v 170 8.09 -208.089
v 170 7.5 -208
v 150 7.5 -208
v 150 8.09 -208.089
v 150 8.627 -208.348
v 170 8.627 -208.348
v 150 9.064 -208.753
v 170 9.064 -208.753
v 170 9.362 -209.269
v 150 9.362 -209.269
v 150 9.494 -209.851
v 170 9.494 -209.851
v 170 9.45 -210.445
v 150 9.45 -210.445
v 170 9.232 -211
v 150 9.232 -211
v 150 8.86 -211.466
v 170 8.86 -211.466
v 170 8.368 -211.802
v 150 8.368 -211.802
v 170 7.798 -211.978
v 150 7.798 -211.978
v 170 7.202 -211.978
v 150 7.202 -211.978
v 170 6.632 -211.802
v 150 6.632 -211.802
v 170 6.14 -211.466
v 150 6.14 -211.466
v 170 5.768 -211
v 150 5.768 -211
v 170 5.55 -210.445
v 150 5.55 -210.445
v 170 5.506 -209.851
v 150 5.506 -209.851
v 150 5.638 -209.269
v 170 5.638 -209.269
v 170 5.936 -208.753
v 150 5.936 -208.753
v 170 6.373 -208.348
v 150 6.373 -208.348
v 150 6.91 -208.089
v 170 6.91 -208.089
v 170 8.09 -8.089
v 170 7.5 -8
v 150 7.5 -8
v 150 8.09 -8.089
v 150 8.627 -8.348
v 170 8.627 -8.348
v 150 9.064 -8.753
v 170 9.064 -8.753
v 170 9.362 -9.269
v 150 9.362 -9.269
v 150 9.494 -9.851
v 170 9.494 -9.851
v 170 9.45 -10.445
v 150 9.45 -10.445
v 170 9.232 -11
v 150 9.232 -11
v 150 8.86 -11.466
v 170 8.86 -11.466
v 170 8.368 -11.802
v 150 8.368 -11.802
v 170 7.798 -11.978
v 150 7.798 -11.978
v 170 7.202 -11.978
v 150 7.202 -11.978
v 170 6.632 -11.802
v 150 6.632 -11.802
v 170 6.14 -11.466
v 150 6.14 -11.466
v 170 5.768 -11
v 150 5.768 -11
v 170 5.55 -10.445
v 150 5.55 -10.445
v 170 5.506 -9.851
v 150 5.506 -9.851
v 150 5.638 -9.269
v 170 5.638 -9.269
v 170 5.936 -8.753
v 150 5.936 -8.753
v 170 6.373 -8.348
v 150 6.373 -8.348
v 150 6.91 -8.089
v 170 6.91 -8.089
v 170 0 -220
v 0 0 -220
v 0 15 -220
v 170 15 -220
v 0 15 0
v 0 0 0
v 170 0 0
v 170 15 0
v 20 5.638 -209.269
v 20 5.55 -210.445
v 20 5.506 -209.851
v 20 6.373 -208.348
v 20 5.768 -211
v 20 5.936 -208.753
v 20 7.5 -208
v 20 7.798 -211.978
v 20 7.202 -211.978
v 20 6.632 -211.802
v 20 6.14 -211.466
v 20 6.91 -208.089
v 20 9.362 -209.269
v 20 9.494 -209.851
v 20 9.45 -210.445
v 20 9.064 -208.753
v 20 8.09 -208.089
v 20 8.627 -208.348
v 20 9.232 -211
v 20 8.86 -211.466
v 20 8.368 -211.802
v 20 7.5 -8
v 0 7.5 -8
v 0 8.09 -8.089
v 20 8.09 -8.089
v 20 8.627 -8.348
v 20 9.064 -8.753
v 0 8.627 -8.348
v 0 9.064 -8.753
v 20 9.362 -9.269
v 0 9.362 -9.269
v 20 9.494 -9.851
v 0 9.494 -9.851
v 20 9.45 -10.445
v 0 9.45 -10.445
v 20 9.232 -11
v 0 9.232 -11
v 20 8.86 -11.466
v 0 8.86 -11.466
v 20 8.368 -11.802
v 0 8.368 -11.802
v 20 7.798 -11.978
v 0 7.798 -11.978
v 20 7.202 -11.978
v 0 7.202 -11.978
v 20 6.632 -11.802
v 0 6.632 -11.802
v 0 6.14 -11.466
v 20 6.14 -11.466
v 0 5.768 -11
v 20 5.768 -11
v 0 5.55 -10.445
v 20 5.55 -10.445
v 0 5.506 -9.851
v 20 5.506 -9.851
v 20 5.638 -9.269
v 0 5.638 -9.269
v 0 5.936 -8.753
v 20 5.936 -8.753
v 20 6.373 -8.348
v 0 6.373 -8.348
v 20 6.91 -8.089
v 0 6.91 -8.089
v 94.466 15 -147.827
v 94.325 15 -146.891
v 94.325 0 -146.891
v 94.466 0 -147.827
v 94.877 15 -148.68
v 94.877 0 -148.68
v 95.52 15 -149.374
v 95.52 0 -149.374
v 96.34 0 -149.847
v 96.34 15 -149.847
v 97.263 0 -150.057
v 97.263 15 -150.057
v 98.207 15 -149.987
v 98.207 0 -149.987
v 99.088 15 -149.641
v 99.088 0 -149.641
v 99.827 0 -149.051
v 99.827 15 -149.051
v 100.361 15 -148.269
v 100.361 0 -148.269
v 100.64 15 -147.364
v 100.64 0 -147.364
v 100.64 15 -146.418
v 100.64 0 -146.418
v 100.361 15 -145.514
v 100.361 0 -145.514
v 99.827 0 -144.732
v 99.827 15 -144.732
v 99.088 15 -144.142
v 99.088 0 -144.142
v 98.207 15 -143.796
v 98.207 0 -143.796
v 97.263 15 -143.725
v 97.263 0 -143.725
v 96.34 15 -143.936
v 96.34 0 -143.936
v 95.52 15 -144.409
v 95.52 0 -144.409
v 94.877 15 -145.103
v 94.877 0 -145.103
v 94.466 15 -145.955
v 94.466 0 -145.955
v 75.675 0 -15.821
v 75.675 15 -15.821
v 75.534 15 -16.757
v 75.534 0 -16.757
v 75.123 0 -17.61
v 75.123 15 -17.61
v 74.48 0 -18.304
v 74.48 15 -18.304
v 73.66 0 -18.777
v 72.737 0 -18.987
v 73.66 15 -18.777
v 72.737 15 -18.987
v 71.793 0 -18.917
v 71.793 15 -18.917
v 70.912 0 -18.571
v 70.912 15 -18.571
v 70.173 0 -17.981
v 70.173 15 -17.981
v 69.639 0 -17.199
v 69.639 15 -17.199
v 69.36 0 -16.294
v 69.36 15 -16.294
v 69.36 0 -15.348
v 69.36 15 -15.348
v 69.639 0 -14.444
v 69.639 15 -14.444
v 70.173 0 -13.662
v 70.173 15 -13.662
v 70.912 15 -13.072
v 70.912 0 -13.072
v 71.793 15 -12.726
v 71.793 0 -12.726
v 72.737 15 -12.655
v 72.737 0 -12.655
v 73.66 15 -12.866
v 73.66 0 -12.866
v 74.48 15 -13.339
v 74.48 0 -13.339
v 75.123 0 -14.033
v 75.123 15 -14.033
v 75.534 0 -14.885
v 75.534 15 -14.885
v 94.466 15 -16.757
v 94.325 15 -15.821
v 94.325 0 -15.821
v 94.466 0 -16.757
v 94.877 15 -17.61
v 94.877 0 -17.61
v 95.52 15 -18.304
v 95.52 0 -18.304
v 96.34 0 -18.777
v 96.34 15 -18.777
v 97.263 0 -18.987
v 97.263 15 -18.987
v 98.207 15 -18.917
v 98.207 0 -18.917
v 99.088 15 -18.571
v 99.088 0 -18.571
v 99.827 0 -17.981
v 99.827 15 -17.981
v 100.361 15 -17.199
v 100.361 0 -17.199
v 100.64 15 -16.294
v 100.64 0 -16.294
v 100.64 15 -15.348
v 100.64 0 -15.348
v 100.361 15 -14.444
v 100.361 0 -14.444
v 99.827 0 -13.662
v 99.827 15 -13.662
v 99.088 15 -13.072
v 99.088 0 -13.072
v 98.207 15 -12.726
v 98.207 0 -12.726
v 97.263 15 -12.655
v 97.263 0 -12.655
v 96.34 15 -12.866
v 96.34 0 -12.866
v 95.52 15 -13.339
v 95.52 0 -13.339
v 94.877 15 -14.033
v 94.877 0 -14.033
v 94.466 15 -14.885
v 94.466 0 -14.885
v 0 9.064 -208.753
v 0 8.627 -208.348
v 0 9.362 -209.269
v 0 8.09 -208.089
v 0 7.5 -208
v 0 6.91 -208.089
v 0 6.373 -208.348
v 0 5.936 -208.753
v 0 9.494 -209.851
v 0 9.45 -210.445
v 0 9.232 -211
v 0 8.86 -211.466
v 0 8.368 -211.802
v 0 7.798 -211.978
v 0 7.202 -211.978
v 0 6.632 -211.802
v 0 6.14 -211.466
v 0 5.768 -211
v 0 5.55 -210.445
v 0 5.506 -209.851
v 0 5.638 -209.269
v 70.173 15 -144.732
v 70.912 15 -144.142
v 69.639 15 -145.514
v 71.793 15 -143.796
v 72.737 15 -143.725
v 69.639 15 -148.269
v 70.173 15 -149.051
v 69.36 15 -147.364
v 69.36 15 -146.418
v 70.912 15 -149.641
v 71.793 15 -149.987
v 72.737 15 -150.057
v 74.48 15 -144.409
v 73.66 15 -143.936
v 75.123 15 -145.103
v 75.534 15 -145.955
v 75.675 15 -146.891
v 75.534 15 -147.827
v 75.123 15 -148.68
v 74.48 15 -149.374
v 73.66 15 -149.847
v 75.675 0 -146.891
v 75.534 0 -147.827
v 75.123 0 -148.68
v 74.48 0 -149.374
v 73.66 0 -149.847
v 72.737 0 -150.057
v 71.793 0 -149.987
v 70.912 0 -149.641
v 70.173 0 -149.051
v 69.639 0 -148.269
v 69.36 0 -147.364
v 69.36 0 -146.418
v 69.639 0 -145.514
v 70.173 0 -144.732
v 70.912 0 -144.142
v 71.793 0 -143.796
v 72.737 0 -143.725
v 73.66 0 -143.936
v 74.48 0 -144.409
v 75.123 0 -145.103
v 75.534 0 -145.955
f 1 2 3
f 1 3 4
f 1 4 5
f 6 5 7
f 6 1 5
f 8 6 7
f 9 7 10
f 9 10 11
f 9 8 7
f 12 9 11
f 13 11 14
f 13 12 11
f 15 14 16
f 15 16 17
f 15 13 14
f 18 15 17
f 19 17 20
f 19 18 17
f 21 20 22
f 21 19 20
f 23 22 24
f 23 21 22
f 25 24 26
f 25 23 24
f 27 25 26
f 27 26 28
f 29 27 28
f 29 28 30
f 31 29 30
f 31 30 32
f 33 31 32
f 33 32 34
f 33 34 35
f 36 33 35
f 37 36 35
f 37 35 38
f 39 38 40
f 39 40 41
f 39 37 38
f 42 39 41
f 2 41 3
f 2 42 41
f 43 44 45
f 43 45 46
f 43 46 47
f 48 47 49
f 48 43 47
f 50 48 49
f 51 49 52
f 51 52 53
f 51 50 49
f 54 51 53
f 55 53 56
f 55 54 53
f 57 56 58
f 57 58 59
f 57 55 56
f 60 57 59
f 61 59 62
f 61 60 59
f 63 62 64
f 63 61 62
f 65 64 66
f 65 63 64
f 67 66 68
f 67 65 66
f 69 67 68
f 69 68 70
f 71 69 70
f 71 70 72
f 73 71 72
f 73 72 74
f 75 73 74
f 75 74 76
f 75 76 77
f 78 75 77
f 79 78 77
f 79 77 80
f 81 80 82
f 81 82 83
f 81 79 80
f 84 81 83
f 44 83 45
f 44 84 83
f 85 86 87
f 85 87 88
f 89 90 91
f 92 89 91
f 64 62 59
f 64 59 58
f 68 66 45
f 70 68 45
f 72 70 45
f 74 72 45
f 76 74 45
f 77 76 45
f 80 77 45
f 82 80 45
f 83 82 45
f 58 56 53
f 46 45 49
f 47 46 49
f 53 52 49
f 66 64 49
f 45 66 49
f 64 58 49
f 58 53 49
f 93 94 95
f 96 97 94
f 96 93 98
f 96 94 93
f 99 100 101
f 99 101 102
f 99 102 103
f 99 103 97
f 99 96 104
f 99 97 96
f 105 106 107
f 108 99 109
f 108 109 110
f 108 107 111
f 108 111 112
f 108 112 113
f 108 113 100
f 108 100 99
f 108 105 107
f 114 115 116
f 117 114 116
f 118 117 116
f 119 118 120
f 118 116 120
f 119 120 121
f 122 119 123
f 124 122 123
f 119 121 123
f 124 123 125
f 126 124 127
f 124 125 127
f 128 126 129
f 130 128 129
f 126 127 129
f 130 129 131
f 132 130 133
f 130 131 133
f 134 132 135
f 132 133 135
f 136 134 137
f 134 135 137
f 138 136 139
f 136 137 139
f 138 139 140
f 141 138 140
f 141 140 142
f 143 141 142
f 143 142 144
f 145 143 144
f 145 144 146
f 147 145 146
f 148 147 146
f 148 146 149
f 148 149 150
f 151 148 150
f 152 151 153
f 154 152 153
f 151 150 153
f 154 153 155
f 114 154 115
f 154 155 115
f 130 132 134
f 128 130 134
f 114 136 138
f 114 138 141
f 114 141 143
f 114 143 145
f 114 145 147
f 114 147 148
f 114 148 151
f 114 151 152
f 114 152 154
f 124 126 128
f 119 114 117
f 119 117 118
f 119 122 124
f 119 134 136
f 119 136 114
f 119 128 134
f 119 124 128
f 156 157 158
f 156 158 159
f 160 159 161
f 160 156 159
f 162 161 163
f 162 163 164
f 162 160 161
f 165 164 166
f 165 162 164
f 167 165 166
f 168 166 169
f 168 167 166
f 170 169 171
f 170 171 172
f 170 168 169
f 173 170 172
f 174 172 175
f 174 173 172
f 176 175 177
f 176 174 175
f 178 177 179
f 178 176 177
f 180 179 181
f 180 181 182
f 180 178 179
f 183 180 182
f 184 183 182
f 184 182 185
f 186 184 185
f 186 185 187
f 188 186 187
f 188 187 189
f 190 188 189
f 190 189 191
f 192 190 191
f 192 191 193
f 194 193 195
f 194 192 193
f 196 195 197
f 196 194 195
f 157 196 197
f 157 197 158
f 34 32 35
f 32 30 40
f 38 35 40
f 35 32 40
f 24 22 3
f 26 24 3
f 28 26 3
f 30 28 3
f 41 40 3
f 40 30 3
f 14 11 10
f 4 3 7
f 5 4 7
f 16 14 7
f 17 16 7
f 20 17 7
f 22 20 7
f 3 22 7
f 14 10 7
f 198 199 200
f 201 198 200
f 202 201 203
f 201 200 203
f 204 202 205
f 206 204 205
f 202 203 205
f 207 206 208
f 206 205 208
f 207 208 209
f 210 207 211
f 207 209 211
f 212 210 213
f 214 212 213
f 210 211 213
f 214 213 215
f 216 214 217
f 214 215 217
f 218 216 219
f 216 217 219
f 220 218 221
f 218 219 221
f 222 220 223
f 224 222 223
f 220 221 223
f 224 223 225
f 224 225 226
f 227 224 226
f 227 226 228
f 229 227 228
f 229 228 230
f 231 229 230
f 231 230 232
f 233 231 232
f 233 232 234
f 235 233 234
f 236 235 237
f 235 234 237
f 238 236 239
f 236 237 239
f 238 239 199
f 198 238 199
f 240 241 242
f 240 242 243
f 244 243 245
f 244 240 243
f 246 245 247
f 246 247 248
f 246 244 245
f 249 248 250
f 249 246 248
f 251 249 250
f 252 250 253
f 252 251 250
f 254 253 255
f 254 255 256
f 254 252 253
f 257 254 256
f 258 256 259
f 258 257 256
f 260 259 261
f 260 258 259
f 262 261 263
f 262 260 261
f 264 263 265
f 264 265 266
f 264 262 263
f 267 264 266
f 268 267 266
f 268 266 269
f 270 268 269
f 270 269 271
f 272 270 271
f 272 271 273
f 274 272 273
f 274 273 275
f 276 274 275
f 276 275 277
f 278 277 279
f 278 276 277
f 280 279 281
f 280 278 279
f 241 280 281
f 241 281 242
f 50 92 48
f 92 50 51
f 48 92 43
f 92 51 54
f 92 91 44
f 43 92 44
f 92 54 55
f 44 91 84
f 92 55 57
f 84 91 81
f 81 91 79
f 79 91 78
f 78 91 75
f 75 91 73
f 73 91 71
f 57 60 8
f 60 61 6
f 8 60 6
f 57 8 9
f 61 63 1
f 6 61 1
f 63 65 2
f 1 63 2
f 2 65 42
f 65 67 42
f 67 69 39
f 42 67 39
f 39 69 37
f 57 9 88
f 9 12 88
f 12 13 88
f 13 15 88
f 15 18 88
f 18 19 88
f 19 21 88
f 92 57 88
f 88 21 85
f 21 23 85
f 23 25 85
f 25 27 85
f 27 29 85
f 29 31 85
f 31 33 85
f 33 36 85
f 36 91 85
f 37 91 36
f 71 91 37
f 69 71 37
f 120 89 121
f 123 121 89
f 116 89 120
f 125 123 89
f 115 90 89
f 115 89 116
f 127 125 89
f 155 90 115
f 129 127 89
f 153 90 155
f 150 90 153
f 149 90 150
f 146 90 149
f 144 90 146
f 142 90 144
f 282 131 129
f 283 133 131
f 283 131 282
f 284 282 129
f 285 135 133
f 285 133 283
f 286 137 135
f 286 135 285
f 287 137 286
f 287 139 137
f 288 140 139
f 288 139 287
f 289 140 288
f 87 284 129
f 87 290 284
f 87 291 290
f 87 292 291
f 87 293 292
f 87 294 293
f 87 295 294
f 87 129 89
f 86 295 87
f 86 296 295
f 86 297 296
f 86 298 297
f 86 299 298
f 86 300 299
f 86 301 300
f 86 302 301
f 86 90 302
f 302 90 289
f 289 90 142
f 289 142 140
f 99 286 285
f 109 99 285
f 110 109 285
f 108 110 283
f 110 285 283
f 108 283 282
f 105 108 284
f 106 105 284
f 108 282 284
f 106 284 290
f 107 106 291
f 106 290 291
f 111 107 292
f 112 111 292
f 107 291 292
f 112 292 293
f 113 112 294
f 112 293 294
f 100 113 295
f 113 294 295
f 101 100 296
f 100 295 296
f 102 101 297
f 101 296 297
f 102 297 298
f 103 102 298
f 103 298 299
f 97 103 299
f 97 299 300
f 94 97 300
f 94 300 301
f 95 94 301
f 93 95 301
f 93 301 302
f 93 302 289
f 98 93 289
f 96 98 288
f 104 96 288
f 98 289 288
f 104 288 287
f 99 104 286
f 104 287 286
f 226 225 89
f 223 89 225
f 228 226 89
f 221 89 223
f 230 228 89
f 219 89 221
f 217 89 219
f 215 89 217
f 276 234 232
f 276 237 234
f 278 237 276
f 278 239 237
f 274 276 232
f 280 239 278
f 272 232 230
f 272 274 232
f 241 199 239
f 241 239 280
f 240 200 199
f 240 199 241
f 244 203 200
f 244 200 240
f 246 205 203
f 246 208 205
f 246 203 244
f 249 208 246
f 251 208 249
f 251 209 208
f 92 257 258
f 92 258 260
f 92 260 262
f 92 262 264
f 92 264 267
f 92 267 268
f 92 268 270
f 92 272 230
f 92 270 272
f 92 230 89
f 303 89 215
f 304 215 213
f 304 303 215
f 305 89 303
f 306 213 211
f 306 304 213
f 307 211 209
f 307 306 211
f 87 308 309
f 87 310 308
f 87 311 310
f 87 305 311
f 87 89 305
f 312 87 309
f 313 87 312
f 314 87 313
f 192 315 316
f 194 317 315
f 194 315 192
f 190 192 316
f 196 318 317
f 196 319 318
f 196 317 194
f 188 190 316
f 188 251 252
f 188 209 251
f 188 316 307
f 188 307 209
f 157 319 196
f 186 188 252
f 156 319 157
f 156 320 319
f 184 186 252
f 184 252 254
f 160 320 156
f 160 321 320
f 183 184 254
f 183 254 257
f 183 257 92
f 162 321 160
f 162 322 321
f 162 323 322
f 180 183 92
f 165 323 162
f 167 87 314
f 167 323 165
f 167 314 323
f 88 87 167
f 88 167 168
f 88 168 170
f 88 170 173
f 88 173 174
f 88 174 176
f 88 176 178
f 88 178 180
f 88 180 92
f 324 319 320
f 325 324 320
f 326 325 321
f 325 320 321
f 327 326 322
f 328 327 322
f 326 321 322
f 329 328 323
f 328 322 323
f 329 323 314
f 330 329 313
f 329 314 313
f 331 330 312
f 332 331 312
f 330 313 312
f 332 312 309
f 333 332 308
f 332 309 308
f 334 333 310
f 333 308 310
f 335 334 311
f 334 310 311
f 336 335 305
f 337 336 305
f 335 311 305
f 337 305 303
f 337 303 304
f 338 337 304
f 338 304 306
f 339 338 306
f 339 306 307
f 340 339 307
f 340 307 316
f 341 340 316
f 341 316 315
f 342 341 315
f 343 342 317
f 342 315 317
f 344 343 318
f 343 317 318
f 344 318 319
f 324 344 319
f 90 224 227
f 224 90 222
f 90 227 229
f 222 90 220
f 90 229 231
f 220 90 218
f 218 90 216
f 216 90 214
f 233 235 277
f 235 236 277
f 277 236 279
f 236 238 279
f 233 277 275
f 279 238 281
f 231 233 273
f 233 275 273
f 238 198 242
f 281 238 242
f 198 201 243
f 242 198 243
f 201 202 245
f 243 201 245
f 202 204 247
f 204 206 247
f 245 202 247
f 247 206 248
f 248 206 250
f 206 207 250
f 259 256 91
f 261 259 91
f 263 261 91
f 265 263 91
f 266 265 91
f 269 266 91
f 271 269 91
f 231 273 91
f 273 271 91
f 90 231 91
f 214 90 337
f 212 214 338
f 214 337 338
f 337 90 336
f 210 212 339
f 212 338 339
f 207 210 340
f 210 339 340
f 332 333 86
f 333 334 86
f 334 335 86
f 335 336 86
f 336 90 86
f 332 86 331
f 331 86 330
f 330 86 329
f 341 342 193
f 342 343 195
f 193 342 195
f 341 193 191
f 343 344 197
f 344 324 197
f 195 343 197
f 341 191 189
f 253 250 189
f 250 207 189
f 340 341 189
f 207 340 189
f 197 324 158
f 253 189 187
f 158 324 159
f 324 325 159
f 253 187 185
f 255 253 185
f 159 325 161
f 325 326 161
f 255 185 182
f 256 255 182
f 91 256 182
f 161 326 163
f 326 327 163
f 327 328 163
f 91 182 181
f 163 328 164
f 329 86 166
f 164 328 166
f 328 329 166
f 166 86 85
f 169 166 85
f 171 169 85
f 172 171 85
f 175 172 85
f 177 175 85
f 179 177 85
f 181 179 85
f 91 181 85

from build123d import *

# Parameters (mm, degrees)
SKETCH1_W           = 170
SKETCH1_H           = 220
BOSS_EXTRUDE1_DEPTH = 15
SKETCH2_R           = 2
CUT_EXTRUDE1_DEPTH  = 20
SKETCH3_R           = 3.175
CUT_EXTRUDE2_DEPTH  = 15


with BuildPart() as part:
    # Sketch1 → Boss-Extrude1 (new body)
    with BuildSketch(Plane(origin=(0, 0, 0), x_dir=(1, 0, 0), z_dir=(0, 1, 0))):
        with Locations((85, 110)):
            Rectangle(SKETCH1_W, SKETCH1_H)
    extrude(amount=BOSS_EXTRUDE1_DEPTH)

    # Sketch2 → Cut-Extrude1 (cut)
    with BuildSketch(Plane.ZY):
        with Locations((-10, 7.5)):
            Circle(SKETCH2_R)
        with Locations((-210, 7.5)):
            Circle(SKETCH2_R)
    cut_extrude1 = extrude(amount=-CUT_EXTRUDE1_DEPTH, mode=Mode.SUBTRACT)

    # Sketch3 → Cut-Extrude2 (cut)
    with BuildSketch(Plane(origin=(0, 15, 0), x_dir=(1, 0, 0), z_dir=(0, 1, 0))):
        with Locations((72.5, 15.821244145)):
            Circle(SKETCH3_R)
        with Locations((72.5, 146.891244145)):
            Circle(SKETCH3_R)
    cut_extrude2 = extrude(amount=-CUT_EXTRUDE2_DEPTH, mode=Mode.SUBTRACT)

    # Mirror1: Cut-Extrude1, Cut-Extrude2 across plane
    add(cut_extrude1.mirror(Plane.ZY.offset(-85)), mode=Mode.SUBTRACT)
    add(cut_extrude2.mirror(Plane.ZY.offset(-85)), mode=Mode.SUBTRACT)


solid = part.part
